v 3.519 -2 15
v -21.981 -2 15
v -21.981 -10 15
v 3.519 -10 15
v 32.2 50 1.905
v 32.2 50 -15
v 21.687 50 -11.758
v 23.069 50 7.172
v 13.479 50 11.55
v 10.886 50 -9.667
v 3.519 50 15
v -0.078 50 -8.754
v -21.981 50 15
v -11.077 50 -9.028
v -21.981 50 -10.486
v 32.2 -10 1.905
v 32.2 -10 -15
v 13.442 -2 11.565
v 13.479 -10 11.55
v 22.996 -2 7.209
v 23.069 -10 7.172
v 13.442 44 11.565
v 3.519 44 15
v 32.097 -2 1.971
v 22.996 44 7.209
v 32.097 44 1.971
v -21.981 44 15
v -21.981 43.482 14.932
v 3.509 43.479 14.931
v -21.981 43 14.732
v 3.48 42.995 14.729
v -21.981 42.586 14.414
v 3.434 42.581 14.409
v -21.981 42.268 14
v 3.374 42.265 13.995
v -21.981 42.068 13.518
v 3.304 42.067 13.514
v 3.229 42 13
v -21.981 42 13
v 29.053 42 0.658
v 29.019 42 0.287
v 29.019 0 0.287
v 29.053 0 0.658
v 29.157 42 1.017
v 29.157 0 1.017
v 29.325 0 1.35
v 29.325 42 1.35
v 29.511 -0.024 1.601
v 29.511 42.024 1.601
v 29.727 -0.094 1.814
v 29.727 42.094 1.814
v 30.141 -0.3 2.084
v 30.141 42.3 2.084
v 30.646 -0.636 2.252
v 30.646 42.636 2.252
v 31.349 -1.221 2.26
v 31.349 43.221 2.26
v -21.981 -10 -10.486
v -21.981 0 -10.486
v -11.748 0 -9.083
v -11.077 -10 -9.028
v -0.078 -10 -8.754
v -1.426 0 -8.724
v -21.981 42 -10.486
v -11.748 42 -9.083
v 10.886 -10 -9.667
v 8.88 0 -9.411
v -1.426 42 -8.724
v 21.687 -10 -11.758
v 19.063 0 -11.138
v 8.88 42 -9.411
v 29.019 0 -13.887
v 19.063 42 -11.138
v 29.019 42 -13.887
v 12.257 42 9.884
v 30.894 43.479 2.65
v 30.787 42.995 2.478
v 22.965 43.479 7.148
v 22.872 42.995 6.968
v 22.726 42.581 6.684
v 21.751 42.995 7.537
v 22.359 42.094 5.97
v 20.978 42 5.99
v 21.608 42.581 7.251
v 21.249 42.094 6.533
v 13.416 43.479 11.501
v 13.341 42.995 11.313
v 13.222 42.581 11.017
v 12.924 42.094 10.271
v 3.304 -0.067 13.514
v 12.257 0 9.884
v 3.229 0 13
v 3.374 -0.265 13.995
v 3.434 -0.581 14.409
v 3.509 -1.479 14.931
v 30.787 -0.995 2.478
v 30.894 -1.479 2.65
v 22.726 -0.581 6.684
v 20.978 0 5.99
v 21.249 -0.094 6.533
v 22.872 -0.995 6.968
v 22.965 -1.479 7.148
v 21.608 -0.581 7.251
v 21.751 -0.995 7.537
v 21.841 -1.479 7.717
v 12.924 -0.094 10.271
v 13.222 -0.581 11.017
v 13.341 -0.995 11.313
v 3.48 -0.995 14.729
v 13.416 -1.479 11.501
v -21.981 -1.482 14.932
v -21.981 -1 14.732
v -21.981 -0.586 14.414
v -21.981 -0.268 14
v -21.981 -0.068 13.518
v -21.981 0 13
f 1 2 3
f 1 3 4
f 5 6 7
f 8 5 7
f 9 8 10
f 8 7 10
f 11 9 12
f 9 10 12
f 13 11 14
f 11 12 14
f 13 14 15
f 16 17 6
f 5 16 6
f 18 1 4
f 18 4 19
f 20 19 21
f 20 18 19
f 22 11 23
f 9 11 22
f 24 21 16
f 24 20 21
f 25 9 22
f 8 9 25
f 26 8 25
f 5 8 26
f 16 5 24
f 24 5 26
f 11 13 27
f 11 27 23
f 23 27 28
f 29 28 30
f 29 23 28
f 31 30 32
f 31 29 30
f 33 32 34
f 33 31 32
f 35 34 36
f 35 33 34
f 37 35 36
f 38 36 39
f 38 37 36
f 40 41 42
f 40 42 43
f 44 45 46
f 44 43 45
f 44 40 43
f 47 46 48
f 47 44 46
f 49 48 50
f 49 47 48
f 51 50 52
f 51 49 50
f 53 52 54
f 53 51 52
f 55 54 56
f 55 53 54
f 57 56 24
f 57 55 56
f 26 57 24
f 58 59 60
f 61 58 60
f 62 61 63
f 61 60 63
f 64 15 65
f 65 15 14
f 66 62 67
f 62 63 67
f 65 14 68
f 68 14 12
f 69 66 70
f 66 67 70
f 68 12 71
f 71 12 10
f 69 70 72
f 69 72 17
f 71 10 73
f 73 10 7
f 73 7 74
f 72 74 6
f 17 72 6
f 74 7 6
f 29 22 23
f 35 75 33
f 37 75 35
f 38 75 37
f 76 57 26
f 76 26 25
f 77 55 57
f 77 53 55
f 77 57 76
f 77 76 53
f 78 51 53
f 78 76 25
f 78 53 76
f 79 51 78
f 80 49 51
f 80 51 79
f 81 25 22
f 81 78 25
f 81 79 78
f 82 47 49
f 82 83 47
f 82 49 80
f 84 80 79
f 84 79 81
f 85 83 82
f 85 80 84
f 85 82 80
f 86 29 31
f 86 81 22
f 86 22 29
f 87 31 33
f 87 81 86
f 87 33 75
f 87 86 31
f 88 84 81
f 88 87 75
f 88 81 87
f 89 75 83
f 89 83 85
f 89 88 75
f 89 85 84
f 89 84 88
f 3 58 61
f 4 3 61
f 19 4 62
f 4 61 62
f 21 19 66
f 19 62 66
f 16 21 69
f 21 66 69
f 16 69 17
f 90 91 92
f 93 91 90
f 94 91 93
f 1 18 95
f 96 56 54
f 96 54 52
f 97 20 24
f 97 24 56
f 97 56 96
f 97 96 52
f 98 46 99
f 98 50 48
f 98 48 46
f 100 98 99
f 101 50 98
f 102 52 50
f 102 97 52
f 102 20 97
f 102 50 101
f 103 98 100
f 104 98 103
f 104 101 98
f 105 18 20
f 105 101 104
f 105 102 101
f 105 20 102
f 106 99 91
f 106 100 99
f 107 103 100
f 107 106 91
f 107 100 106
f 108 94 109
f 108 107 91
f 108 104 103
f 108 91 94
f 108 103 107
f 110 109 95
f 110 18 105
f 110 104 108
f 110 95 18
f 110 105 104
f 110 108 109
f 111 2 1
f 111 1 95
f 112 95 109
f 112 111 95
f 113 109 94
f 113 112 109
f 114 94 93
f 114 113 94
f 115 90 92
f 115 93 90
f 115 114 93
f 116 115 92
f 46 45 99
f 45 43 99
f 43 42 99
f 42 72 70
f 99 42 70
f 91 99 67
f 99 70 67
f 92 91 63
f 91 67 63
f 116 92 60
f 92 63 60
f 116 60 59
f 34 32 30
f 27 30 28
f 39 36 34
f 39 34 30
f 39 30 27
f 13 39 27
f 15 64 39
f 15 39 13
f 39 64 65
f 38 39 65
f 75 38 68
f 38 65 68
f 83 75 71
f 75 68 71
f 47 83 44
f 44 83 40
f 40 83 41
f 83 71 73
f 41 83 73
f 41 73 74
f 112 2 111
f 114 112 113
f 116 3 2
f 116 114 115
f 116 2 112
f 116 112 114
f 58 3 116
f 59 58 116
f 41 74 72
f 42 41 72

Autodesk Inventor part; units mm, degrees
ref_plane "YZ Plane" through (0, 0, 0) normal (1, 0, 0) x (0, 1, 0)
ref_plane "XZ Plane" through (0, 0, 0) normal (0, 1, 0) x (-1, 0, 0)
ref_plane "XY Plane" through (0, 0, 0) normal (0, 0, 1) x (1, 0, 0)
sketch "Skizze1" plane through (0, 0, 0) normal (0, 0, 1) x (1, 0, 0)
  line L0 (9, 36) -> (9, 6) construction
  line L1 (-9, 36) -> (9, 36) construction
  line L2 (-9, 6) -> (-9, 36) construction
  line L3 (-9, 6) -> (9, 6) construction
  line L4 (9, 36) -> (9, 6) construction
  line L5 (-9, 42) -> (9, 42) construction
  line L6 (9, 6) -> (9, 0) construction
  line L7 (-9, 42) -> (-31, 42) construction
  line L8 (2.1623, -5) -> (-7.3221, -5) construction
  line L9 (-9, 0) -> (9, 0) construction
  line L10 (2.1623, 6.8548) -> (2.1623, -5) construction
  line L11 (4.0374, -5) -> (4.0374, 6.8548) construction
  line L12 (4.0374, -5) -> (2.1623, -5) construction
  line L13 (9, 42) -> (9, 36) construction
  line L14 (32.5442, 50) -> (-21.2, 50) construction
  line L15 (-22.4813, -15) -> (-22.4813, 53) construction
  arc A0 (-22.4813, 53) -> (-24.4813, 55) centre (-24.4813, 53) ccw construction
  arc A1 (-24.6813, -15) -> (-22.6813, -13) centre (-24.6813, -13) ccw construction
  line L16 (-22.6813, -13) -> (-22.6813, -12) construction
  line L17 (-24.4813, -13) -> (-47, -13) construction
  line L18 (-24.4813, 53) -> (-24.4813, -13) construction
  line L19 (-47, 53) -> (-24.4813, 53) construction
  line L20 (-47, -13) -> (-47, 53) construction
  line L21 (-9, 6) -> (-9, 0) construction
  line L22 (-8.7, -6) -> (-8.7, -4) construction
  line L23 (-8.7, -6) -> (-8.7, -4) construction
  line L24 (-8.7, -4) -> (-7.7, -4) construction
  line L25 (-7.7, -4) -> (-7.7, -6) construction
  line L26 (-7.7, -6) -> (-4.7, -6) construction
  line L27 (-4.7, 1) -> (-4.7, -6) construction
  line L28 (-4.7, 1) -> (-9.7, 1) construction
  line L29 (-9.7, 1) -> (-9.7, -6) construction
  line L30 (-9.7, -6) -> (-8.7, -6) construction
  line L31 (-9, 0.5858) -> (-9, 7.4142) construction
  line L32 (-31, 0) -> (-9, 0) construction
  line L33 (-21.2, 52) -> (-21.2, 50) construction
  line L34 (-21.2, -10) -> (32.5442, -10) construction
  line L35 (-21.2, -10) -> (-21.2, -12) construction
  line L36 (32.2, 50) -> (32.2, 35.4011) construction
  line L37 (32.2, 4.5989) -> (32.2, -10) construction
  line L38 (-21.9813, -10) -> (32.2, -10)
  line L39 (32.2, -10) -> (32.2, 50)
  line L40 (32.2, 50) -> (-21.9813, 50)
  line L41 (-21.9813, 42) -> (29.0187, 42)
  line L42 (29.0187, 42) -> (29.0187, 0)
  line L43 (29.0187, 0) -> (-21.9813, 0)
  line L44 (-21.9813, -10) -> (-21.9813, 0)
  line L45 (-21.9813, 42) -> (-21.9813, 50)
  point P0 (0, 0)
extrude "Extrusion1" add sketch "Skizze1" along normal mid plane 30
sketch "Skizze2" plane through (-21.9813, 50, 15) normal (0, 1, 0) x (1, 0, 0)
  circle A0 centre (33.5439, 8.6575) radius 2.15 construction
  circle A1 centre (12.1205, 3.0946) radius 2.15 construction
  arc A2 (-10.3687, -0.3954) -> (-6.0687, -0.3954) centre (-8.2187, -0.3954) ccw construction
  line L0 (-10.3687, -0.3954) -> (-10.3687, 4.6046) construction
  arc A3 (-6.0687, 4.6046) -> (-10.3687, 4.6046) centre (-8.2187, 4.6046) ccw construction
  line L1 (-6.0687, 4.6046) -> (-6.0687, -0.3954) construction
  line L2 (-6.0687, 21.1993) -> (-6.0687, 16.1993) construction
  arc A4 (-10.3687, 16.1993) -> (-6.0687, 16.1993) centre (-8.2187, 16.1993) ccw construction
  line L3 (-10.3687, 16.1993) -> (-10.3687, 21.1993) construction
  arc A5 (-6.0687, 21.1993) -> (-10.3687, 21.1993) centre (-8.2187, 21.1993) ccw construction
  line L4 (58.3, 29.6207) -> (63.3, 29.6207) construction
  line L5 (58.3, 29.6207) -> (58.3, 23.282) construction
  line L6 (58.3, 23.282) -> (57.1813, 23.282) construction
  line L7 (57.1813, 23.282) -> (57.1813, 29.0056) construction
  arc A6 (-9.2981, 25.6207) -> (57.1813, 29.0056) centre (18.9366, 125.6108) ccw construction
  line L8 (-18.2187, 25.6207) -> (-9.2981, 25.6207) construction
  line L9 (-18.2187, -4.3793) -> (-18.2187, 25.6207) construction
  line L10 (-2.7, -4.3793) -> (-18.2187, -4.3793) construction
  arc A7 (-0.7916, -2.3814) -> (-2.7, -4.3793) centre (-0.7, -4.3793) ccw construction
  arc A8 (-0.7916, -2.3814) -> (63.3, 22.1907) centre (-5.7872, 106.5198) ccw construction
  line L11 (63.3, 29.6207) -> (63.3, 22.1907) construction
  arc A9 (-0.7, -4.3793) -> (62.5308, 19.0147) centre (-5.7872, 106.5198) ccw construction
  arc A10 (-0.7, 25.6207) -> (57.1813, 31.16) centre (18.9366, 125.6108) ccw construction
  arc A11 (-0.7, 25.6207) -> (57.1813, 31.16) centre (18.9366, 125.6108) ccw construction
  line L12 (51, 0) -> (0, 0) construction
  line L13 (54.1813, 0) -> (54.1813, 30) construction
  arc A12 (25.5, 0) -> (54.1813, 13.0946) centre (-5.8671, 106.662) ccw
  line L14 (0, 0) -> (0, 30) construction
  arc A13 (0, 25.4858) -> (54.1813, 30) centre (18.9366, 125.6108) ccw
  line L15 (54.1813, 0) -> (25.5, 0)
  line L16 (54.1813, 13.0946) -> (54.1813, 0)
  line L17 (0, 25.9057) -> (0, 30)
  line L18 (0, 30) -> (51, 30) projected
  line L19 (0, 30) -> (54.1813, 30)
  line L20 (0, 25.9057) -> (0, 25.4858)
  point P0 (21.9813, 15)
extrude "Extrusion2" cut sketch "Skizze2" against normal through all
fillet "Rundung1" radius 2 5 edges at (16.6181, 0, 10.237) (-9.2313, 0, 15) (-9.2313, 42, 15) (16.6181, 42, 10.237) (29.0187, 21, 3.8723)
properties part number "Stiff_motor"
